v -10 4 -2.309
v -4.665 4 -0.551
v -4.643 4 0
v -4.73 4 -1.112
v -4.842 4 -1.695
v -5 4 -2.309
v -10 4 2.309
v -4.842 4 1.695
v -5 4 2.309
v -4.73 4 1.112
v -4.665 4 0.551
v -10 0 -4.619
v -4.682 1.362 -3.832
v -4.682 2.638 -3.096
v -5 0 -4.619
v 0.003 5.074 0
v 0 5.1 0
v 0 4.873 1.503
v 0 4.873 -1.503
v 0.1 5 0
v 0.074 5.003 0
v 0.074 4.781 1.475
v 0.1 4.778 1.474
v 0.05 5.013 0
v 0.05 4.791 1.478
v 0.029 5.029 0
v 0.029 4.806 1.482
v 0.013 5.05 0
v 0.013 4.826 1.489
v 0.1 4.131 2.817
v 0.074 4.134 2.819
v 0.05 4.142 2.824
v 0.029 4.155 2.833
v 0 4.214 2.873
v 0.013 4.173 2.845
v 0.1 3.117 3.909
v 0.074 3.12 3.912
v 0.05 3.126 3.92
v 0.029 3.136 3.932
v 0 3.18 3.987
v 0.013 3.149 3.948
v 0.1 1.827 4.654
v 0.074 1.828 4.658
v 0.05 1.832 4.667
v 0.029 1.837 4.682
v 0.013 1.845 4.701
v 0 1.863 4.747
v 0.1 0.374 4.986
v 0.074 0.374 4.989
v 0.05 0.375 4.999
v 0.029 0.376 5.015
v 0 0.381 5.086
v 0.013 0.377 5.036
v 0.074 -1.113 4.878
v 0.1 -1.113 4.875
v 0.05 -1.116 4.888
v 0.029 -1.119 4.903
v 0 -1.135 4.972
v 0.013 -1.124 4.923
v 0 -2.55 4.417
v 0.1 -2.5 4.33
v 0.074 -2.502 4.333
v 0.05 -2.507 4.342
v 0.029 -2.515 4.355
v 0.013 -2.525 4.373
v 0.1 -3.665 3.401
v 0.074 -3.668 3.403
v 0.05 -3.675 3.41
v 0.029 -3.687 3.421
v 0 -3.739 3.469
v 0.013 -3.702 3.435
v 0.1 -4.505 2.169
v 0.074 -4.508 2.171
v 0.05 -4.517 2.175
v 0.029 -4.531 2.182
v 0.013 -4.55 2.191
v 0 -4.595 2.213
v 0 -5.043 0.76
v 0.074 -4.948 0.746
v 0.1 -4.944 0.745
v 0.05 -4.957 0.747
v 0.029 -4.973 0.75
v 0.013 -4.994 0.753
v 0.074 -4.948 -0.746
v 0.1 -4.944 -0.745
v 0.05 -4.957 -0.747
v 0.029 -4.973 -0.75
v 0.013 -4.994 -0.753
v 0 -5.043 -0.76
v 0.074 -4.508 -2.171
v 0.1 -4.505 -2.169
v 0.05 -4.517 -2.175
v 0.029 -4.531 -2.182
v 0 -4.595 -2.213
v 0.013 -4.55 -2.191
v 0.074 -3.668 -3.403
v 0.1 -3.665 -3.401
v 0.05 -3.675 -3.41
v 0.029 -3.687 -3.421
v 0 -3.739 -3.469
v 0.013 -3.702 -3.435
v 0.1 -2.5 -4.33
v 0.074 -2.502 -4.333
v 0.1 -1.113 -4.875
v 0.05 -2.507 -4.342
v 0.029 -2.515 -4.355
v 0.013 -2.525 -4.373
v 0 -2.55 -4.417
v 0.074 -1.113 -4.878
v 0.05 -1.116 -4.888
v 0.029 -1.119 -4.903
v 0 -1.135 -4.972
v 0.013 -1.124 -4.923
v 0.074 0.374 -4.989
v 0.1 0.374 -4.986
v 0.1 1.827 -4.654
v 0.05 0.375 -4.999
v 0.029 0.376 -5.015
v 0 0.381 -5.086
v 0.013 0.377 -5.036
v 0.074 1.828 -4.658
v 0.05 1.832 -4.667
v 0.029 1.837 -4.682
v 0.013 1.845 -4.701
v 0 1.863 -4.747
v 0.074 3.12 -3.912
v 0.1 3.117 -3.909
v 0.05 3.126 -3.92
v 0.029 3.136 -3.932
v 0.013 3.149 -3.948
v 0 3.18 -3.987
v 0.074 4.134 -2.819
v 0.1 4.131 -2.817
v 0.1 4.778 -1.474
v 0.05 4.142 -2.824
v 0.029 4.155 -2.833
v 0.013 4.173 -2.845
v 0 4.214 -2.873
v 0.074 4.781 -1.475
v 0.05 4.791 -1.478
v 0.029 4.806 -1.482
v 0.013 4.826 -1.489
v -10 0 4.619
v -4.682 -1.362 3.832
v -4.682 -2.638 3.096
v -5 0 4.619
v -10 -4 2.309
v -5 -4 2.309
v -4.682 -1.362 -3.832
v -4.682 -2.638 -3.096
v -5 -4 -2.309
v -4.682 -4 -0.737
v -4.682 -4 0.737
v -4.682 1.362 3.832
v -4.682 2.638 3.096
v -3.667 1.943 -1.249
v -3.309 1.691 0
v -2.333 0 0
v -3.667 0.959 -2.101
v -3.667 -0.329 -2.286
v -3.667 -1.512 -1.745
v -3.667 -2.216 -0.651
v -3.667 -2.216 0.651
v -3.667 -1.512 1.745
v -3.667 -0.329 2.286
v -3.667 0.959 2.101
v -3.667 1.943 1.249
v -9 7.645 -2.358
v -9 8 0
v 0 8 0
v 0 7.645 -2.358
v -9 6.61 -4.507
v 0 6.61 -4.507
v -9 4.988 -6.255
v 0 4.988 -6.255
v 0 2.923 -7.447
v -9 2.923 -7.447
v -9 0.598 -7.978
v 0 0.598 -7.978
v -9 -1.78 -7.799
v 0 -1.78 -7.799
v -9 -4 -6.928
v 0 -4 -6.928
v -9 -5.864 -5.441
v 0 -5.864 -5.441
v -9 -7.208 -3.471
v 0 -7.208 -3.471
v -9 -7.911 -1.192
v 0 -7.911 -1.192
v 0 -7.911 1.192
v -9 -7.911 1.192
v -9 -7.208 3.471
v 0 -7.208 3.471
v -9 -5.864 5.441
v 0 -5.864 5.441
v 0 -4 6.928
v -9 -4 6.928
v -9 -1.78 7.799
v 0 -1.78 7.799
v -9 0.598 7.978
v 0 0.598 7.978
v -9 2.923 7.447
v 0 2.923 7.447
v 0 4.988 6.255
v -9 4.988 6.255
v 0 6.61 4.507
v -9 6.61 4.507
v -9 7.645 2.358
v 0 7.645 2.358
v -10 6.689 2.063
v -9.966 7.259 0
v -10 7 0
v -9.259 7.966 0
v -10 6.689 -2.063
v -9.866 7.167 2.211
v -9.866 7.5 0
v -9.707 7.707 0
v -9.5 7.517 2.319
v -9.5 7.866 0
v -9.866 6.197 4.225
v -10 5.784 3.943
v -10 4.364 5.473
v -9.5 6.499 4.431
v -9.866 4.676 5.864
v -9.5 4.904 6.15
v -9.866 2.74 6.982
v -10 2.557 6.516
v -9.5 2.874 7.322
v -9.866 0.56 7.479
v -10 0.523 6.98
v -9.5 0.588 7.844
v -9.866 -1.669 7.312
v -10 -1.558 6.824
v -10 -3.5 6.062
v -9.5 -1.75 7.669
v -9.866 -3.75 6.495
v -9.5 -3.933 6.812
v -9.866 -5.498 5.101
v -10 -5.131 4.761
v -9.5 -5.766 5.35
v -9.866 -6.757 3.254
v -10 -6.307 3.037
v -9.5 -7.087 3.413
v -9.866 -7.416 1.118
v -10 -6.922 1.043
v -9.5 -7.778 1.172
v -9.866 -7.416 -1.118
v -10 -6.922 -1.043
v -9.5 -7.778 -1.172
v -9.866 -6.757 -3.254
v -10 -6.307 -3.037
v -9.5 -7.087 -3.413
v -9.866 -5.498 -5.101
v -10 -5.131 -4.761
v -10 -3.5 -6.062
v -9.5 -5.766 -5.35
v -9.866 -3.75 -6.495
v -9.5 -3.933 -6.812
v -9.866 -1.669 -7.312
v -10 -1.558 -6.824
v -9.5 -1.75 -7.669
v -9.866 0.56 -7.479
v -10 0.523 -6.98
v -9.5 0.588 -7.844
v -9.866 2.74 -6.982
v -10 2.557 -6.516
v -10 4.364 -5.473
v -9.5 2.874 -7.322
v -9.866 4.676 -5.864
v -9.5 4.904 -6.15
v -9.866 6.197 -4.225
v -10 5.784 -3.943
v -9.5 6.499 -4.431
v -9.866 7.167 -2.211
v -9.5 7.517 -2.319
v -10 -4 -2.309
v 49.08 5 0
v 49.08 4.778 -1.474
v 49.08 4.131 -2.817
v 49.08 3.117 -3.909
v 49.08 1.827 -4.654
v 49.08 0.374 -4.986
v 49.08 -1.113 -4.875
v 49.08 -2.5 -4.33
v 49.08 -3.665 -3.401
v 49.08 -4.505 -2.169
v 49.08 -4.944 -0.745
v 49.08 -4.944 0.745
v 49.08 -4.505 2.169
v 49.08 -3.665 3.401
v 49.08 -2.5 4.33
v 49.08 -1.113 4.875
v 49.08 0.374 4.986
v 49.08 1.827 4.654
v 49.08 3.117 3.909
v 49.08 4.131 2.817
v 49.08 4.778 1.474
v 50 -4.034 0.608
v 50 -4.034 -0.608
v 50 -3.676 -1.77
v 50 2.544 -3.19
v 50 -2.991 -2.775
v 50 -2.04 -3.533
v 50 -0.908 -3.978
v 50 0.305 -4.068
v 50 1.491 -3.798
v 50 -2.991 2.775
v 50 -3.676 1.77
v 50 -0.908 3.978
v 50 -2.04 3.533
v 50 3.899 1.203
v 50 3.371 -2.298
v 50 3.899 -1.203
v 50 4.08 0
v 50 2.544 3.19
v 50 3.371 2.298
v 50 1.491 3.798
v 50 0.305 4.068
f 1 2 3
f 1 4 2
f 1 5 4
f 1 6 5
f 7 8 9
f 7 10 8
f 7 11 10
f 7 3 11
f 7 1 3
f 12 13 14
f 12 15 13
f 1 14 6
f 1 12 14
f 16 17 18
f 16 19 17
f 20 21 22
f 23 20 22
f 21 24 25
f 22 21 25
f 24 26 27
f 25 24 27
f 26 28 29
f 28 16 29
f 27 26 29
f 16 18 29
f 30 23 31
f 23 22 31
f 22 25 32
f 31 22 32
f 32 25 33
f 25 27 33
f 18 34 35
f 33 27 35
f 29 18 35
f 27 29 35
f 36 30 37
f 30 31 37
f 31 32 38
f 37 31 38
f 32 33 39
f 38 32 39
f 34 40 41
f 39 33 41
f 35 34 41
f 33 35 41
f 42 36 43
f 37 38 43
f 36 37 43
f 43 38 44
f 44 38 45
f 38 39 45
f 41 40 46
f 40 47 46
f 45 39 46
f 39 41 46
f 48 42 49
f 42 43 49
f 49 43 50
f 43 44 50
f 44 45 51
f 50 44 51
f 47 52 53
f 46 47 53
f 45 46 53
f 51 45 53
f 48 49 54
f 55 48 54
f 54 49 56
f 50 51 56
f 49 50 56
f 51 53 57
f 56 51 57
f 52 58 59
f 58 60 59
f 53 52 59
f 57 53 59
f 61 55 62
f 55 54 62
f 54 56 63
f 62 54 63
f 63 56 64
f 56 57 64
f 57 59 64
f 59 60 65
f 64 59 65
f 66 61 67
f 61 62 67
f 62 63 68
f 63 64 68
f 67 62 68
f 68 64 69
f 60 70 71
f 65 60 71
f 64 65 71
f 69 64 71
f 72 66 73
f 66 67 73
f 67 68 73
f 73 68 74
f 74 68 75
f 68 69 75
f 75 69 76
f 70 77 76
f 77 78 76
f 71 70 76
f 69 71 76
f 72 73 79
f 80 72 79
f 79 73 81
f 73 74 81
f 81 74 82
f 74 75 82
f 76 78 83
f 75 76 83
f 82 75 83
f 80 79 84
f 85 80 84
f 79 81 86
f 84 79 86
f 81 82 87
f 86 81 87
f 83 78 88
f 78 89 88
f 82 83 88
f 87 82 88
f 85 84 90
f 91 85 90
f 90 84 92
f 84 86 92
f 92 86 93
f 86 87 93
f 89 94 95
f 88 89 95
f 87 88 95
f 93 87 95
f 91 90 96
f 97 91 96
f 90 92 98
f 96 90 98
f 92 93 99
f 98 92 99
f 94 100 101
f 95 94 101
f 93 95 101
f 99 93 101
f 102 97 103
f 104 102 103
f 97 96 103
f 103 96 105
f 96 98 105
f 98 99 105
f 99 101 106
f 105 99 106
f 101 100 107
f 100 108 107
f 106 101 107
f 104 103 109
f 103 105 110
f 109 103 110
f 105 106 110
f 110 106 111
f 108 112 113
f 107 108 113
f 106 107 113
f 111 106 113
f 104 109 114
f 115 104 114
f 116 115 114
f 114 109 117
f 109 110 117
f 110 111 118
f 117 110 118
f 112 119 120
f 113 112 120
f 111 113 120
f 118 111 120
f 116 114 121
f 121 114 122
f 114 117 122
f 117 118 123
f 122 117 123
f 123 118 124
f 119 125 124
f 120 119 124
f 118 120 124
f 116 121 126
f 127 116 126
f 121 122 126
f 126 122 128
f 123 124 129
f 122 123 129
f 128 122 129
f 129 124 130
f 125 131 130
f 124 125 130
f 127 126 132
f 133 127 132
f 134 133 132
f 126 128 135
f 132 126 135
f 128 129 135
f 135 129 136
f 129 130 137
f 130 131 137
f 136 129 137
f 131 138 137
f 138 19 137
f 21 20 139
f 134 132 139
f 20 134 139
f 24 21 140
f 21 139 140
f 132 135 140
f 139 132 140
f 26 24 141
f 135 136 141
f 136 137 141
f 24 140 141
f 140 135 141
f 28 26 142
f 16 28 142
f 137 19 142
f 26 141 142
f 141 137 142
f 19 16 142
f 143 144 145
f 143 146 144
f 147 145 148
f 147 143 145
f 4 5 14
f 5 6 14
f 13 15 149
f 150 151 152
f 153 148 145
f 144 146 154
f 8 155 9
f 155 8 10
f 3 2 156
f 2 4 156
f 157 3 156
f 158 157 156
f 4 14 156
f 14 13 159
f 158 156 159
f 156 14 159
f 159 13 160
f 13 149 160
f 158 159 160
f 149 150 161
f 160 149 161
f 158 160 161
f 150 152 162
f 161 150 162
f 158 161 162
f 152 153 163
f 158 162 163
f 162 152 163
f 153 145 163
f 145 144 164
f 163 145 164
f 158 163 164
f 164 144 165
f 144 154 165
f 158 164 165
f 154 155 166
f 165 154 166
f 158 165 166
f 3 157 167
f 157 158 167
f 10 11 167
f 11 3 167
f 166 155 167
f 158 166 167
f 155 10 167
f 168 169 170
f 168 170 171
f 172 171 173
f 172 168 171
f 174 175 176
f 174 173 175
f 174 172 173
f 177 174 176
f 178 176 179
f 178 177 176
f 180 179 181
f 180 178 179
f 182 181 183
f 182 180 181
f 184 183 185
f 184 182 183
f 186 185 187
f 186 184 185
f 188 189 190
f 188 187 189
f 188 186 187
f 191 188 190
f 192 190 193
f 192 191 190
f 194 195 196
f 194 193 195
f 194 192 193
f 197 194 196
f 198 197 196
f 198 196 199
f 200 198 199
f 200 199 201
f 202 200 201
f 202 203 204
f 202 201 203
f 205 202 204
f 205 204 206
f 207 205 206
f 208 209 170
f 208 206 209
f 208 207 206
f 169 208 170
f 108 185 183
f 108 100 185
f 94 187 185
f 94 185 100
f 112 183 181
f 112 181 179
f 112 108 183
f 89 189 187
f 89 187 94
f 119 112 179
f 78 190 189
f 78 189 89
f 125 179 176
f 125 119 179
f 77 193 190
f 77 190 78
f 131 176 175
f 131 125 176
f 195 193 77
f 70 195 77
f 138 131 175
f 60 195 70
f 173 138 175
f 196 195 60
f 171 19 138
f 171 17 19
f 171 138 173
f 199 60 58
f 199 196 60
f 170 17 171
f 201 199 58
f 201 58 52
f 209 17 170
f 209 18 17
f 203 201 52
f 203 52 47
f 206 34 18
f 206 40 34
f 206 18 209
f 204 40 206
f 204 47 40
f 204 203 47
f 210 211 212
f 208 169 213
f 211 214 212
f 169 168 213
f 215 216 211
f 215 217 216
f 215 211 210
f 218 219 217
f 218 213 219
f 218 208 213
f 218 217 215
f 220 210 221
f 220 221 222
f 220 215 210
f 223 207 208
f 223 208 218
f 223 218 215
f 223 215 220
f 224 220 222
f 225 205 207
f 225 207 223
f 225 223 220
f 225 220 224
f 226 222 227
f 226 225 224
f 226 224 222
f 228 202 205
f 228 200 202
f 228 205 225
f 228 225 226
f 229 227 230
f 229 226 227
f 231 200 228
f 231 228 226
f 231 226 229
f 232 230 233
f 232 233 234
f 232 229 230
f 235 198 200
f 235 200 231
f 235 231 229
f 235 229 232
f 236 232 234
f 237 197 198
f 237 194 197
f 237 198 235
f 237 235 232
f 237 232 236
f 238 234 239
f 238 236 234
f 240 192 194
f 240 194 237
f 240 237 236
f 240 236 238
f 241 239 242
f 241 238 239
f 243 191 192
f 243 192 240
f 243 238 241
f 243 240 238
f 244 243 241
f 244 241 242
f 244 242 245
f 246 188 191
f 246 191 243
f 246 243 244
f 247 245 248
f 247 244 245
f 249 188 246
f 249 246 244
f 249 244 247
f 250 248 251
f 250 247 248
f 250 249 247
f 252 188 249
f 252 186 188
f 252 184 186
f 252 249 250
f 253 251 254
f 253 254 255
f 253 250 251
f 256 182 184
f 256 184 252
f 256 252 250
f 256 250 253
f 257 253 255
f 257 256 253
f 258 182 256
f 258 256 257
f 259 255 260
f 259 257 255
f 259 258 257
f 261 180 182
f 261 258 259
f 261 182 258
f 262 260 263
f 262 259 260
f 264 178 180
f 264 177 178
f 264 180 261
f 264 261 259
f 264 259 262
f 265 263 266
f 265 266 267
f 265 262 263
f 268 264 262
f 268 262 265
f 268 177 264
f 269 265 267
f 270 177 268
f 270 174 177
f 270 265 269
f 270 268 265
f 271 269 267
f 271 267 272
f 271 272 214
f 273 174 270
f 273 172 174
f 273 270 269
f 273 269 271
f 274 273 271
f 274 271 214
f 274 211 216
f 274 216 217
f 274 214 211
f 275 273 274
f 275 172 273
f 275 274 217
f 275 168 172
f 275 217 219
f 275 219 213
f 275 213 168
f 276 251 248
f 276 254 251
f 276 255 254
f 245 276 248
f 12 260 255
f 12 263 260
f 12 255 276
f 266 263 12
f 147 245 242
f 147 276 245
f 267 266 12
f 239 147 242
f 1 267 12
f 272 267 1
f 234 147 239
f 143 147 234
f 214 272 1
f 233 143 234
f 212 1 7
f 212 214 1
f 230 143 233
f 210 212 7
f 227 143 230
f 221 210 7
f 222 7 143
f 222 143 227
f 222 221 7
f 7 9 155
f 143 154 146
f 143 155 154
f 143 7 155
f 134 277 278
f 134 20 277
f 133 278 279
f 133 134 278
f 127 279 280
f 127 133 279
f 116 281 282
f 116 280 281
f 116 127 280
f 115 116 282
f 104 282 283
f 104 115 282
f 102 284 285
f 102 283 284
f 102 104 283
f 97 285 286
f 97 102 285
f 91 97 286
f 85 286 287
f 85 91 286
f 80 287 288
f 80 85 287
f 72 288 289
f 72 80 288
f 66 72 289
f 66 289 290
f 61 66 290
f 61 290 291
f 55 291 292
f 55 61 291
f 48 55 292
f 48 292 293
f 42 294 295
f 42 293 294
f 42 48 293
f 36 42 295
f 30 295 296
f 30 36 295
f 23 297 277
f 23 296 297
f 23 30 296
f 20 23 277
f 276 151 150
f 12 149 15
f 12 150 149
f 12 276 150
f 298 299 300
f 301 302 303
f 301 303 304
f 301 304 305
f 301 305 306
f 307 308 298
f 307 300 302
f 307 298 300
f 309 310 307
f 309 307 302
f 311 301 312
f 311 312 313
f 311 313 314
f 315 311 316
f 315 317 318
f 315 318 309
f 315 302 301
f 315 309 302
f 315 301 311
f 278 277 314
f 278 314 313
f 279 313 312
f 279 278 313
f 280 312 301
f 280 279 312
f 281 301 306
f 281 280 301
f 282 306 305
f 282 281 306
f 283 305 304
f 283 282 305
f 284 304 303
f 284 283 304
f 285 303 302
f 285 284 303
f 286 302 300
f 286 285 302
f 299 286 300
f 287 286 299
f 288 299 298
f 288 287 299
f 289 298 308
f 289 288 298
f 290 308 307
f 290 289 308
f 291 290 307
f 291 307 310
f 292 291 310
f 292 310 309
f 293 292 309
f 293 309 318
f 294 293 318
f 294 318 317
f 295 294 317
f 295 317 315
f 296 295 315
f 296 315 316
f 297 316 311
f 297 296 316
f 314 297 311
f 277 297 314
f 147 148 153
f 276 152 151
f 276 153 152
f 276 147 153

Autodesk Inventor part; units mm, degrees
ref_plane "YZ Plane" through (0, 0, 0) normal (1, 0, 0) x (0, 1, 0)
ref_plane "XZ Plane" through (0, 0, 0) normal (0, 1, 0) x (-1, 0, 0)
sketch "Rascunho1" plane through (0, 0, 0) normal (0, 0, 1) x (1, 0, 0)
  line L0 (-2.3333, 0) -> (50, 0)
  line L1 (50, 0) -> (50, 5)
  line L2 (50, 5) -> (15, 5)
  line L3 (15, 5) -> (14.0797, 5)
  line L4 (14.0797, 5) -> (0, 5)
  line L5 (0, 5) -> (0, 8)
  line L6 (0, 8) -> (-10, 8)
  line L7 (-10, 8) -> (-10, 4.6188)
  line L8 (-10, 4.6188) -> (-5, 4.6188)
  line L9 (-5, 4.6188) -> (-2.3333, 0)
  line L10 (-24, 0) -> (74, 0) projected
  line L11 (0, -1.6) -> (0, 9.6) projected
  line L12 (15, 5) -> (0, 5) construction
  dimension "d1" = 35
  dimension "d2" = 0.9203
  dimension "d3" = 10
  dimension "d4" = 5
  dimension "d5" = 60
  dimension "d6" = 10
  dimension "d7" = 10
  dimension "d8" = 9.2376
  dimension "d9" = 16
  dimension "d26" = 50
revolve "Corpo" add sketch "Rascunho1" angle 360 about axis through (-2.3333, 0, 0) along (1, 0, 0)
sketch "Rascunho2" plane through (-10, 0, 0) normal (-1, 0, 0) x (0, 0, 1)
  circle A0 centre (0, 0) radius 4.6188 projected
  line L0 (0, -11.2) -> (0, 11.2) projected
  line L1 (-11.2, 0) -> (11.2, 0) projected
  line L2 (4.6188, 0) -> (2.3094, -4)
  line L3 (2.3094, -4) -> (-2.3094, -4)
  line L4 (-2.3094, -4) -> (-4.6188, 0)
  line L5 (-4.6188, 0) -> (-2.3094, 4)
  line L6 (-2.3094, 4) -> (2.3094, 4)
  line L7 (2.3094, 4) -> (4.6188, 0)
extrude "Fenda" add sketch "Rascunho2" against normal up to next contours L7 A0 | A0 L2 | L6 L0 A0 | A0 L0 L3 | L0 L6 A0 | A0 L3 L0 | L4 A0 | A0 L5
fillet "Raio de arredondamento1" radius 1 1 edges at (-10, -8, 0)
thread "Rosca" size "M10x1.5" class "6g" standard "ISO Metric profile" length 35
chamfer "Chanfrar1" distance 0.9202 distance2 0.9202 1 edges at (50, -5, 0) measured on face at (50, -0.8768, -0.3989)
ref_plane "Work Plane1" through (29, 0, 0) normal (0, -1, 0) x (1, 0, 0)
fillet "Fillet2" radius 0.1 1 edges at (0, -5, 0)
equation "\"d1\" = GEL"
equation "\"d3\" = KOH"
equation "\"d4\" = INTI"
equation "\"d6\" = GD"
equation "\"d7\" = BDM"
equation "\"d8\" = 1.1547 * SW"
equation "\"d9\" = KOD"
equation "\"d26\" = NLG"
equation "\"d17\" = RR"
equation "\"d13\" = GEL"
equation "\"d15\" = -0.5 * SPD + 0.5 * GD"
equation "\"d16\" = GUL"
equation "\"d30\" = R"
equation "\"GD\" = NND"
equation "\"NLG\" = 50"
equation "\"GEL\" = 35"
equation "\"KOD\" = 16"
equation "\"KOH\" = 10"
equation "\"INTI\" = 5"
equation "\"GAL\" = 0.61345 * PTC"
equation "\"GUL\" = 0.61345 * PTC"
equation "\"BDM\" = NND"
equation "\"SW\" = 8"
equation "\"RR\" = 0.1 * KOH"
equation "\"SPD\" = NND - 1.2269 * PTC"
equation "\"R\" = 0.1"
equation "\"TOA\" = 30deg"
equation "\"GD1\" = THREADDIA - 1.2269 * PTC"
equation "\"FAWI\" = 45deg"
equation "\"ANG\" = 120deg"
equation "\"PTC\" = 1.5"
equation "\"E0\" = 1.155 * SW"
equation "\"NND\" = 10"
equation "\"THREADDIA\" = 10"
properties part number "DIN 912 - M10x50" material "Aço Inox AISI 304"
